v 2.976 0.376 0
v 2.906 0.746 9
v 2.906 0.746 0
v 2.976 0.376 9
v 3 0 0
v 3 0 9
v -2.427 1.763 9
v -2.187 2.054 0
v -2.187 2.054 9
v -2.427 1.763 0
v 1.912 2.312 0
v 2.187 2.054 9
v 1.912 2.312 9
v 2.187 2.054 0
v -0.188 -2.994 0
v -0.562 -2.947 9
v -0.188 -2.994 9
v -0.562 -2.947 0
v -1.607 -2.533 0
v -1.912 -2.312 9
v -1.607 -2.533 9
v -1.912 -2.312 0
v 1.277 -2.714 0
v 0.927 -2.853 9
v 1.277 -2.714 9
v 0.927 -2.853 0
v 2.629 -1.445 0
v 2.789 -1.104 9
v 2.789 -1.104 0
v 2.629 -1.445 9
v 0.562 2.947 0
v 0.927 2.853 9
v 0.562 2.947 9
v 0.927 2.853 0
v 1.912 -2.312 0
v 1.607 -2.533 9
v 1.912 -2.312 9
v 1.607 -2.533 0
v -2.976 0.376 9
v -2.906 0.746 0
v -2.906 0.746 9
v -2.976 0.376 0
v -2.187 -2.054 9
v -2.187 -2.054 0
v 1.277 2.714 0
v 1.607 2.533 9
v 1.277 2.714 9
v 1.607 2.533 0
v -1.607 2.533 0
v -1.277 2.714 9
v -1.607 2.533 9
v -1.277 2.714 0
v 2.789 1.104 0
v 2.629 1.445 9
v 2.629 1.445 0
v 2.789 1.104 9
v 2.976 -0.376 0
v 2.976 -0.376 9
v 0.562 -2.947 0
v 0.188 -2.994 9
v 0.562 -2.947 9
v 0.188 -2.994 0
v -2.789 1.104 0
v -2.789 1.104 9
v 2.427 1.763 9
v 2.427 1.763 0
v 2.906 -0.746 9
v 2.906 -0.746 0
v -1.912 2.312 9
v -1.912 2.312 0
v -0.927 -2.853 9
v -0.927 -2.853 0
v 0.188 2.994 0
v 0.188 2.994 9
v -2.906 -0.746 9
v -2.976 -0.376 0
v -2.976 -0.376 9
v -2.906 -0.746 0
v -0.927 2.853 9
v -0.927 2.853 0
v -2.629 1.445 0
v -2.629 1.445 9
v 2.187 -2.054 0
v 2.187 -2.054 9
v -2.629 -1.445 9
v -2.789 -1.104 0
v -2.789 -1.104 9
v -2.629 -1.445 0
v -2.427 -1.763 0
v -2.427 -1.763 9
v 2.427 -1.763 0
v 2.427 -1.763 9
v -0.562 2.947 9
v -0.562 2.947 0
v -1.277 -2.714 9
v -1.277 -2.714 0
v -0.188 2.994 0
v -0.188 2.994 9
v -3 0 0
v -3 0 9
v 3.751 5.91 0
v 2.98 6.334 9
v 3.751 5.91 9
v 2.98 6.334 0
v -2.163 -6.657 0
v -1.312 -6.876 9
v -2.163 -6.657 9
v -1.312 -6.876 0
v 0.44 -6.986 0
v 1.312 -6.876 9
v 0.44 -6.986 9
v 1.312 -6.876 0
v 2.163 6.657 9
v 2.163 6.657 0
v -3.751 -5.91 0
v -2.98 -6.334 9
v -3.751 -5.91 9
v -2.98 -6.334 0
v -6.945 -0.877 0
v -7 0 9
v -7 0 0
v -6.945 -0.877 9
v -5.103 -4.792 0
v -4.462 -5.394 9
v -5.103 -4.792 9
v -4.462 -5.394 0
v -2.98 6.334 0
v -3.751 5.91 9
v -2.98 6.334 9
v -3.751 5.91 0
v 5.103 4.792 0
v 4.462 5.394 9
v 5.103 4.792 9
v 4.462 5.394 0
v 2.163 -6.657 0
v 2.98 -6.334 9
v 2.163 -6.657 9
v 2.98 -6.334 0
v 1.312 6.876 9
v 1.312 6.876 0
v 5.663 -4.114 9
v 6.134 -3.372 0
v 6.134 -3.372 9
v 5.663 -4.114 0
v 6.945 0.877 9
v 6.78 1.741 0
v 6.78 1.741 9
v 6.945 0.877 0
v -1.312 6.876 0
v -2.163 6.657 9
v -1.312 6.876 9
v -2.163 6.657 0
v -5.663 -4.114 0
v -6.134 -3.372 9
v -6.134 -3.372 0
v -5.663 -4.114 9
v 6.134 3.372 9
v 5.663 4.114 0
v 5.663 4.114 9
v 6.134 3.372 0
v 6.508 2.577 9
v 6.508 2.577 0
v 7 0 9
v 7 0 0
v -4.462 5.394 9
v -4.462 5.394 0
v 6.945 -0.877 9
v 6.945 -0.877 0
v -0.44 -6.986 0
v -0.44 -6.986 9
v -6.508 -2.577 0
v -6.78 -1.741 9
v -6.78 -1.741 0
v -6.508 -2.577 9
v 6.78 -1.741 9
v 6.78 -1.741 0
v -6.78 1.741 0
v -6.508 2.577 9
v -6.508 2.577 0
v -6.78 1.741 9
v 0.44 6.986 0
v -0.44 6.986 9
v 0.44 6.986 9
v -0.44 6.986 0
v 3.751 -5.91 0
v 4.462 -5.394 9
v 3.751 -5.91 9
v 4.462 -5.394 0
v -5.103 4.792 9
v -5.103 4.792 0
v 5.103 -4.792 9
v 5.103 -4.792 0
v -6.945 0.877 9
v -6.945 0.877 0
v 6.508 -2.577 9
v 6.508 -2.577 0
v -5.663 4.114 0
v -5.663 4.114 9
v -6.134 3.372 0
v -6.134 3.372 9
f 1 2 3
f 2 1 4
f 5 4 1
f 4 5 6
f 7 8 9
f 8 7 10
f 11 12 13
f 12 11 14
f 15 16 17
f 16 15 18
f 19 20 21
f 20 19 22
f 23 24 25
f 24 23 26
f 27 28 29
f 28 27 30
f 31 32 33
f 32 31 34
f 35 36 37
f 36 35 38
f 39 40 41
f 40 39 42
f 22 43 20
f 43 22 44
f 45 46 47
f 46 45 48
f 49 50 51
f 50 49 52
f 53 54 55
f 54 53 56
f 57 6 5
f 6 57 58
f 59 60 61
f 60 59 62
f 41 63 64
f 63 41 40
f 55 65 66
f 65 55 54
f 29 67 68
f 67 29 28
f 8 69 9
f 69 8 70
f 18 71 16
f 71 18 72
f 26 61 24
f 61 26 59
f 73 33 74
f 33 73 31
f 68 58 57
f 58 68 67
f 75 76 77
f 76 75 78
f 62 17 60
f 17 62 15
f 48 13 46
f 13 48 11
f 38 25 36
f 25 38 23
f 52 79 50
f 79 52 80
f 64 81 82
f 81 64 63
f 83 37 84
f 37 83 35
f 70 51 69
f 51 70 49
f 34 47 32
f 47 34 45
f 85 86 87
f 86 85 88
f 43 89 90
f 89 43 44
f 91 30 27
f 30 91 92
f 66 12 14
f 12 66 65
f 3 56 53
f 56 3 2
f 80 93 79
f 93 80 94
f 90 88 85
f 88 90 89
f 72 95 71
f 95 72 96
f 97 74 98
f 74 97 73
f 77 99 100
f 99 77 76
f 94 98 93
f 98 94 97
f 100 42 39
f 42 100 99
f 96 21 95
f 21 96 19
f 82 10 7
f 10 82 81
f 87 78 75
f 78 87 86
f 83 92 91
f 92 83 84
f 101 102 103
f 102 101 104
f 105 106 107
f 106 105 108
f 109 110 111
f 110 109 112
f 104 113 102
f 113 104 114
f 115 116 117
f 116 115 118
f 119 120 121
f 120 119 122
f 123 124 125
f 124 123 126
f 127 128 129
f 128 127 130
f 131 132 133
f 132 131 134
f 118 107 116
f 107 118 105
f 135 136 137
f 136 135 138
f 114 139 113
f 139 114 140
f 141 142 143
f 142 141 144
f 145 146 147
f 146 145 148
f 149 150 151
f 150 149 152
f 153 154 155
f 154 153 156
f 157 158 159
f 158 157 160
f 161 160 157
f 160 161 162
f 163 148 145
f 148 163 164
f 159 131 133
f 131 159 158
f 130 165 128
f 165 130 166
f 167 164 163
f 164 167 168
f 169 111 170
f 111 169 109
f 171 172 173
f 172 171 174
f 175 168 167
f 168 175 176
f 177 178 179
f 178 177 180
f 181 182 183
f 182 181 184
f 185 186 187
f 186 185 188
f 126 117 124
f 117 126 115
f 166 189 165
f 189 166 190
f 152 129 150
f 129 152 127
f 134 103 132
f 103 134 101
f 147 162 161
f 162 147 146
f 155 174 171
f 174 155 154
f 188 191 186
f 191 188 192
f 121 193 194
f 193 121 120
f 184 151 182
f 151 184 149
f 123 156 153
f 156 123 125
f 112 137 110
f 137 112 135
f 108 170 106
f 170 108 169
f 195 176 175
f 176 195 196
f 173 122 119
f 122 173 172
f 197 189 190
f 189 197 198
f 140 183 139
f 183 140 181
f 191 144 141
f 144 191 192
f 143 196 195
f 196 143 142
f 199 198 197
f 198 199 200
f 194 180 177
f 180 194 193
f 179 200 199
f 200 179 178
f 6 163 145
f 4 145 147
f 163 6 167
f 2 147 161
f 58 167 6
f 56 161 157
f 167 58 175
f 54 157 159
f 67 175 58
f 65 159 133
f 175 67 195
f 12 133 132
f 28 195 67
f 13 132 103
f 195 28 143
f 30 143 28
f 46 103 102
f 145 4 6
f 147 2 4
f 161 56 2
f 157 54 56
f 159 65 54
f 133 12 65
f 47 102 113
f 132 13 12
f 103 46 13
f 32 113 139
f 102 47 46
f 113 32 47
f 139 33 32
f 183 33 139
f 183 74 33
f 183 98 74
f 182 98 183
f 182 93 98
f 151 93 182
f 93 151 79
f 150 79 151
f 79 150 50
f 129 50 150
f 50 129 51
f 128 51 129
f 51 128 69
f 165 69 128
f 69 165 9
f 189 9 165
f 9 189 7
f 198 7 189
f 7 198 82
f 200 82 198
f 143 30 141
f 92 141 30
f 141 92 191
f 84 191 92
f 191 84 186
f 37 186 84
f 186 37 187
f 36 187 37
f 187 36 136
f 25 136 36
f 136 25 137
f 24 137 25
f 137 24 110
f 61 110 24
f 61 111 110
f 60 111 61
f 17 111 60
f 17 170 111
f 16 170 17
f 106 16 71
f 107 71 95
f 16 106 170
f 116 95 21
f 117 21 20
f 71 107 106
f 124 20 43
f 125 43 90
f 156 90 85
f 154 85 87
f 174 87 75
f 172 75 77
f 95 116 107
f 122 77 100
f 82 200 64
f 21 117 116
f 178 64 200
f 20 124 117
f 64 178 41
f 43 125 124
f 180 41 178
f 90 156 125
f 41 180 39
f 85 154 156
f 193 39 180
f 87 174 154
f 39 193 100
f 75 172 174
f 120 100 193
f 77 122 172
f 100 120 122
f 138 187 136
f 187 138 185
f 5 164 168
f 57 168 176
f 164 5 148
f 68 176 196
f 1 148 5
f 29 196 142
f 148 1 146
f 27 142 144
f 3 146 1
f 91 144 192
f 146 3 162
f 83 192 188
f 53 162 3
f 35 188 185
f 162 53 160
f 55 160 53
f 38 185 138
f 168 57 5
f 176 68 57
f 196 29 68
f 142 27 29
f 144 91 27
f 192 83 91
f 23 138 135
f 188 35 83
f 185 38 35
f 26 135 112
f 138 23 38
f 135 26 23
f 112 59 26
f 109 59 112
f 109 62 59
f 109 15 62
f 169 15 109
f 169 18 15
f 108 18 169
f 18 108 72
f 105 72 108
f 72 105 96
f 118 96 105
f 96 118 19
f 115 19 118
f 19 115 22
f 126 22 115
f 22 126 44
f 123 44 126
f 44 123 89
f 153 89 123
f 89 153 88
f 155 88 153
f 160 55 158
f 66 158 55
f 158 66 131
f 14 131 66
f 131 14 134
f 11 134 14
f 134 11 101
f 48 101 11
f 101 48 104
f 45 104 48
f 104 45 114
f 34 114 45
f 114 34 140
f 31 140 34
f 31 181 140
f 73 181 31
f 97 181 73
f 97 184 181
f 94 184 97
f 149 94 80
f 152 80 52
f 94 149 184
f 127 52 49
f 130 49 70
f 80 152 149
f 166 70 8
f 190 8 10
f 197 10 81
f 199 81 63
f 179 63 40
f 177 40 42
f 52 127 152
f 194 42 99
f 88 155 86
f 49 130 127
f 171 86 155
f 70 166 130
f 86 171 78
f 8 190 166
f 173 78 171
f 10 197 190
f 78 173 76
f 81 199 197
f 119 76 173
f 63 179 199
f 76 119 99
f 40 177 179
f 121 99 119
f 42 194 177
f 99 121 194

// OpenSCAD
$fn = 50;


difference() {
	union() {
		cylinder(h = 9, r = 7.0000000000);
	}
	union() {
		translate(v = [0.0000000000, 0.0000000000, -100.0000000000]) {
			cylinder(h = 200, r = 3.0000000000);
		}
		translate(v = [0.0000000000, 0.0000000000, -100.0000000000]) {
			cylinder(h = 200, r = 3.0000000000);
		}
		translate(v = [0.0000000000, 0.0000000000, -100.0000000000]) {
			cylinder(h = 200, r = 3.0000000000);
		}
		translate(v = [0.0000000000, 0.0000000000, -100.0000000000]) {
			cylinder(h = 200, r = 3.0000000000);
		}
	}
}
